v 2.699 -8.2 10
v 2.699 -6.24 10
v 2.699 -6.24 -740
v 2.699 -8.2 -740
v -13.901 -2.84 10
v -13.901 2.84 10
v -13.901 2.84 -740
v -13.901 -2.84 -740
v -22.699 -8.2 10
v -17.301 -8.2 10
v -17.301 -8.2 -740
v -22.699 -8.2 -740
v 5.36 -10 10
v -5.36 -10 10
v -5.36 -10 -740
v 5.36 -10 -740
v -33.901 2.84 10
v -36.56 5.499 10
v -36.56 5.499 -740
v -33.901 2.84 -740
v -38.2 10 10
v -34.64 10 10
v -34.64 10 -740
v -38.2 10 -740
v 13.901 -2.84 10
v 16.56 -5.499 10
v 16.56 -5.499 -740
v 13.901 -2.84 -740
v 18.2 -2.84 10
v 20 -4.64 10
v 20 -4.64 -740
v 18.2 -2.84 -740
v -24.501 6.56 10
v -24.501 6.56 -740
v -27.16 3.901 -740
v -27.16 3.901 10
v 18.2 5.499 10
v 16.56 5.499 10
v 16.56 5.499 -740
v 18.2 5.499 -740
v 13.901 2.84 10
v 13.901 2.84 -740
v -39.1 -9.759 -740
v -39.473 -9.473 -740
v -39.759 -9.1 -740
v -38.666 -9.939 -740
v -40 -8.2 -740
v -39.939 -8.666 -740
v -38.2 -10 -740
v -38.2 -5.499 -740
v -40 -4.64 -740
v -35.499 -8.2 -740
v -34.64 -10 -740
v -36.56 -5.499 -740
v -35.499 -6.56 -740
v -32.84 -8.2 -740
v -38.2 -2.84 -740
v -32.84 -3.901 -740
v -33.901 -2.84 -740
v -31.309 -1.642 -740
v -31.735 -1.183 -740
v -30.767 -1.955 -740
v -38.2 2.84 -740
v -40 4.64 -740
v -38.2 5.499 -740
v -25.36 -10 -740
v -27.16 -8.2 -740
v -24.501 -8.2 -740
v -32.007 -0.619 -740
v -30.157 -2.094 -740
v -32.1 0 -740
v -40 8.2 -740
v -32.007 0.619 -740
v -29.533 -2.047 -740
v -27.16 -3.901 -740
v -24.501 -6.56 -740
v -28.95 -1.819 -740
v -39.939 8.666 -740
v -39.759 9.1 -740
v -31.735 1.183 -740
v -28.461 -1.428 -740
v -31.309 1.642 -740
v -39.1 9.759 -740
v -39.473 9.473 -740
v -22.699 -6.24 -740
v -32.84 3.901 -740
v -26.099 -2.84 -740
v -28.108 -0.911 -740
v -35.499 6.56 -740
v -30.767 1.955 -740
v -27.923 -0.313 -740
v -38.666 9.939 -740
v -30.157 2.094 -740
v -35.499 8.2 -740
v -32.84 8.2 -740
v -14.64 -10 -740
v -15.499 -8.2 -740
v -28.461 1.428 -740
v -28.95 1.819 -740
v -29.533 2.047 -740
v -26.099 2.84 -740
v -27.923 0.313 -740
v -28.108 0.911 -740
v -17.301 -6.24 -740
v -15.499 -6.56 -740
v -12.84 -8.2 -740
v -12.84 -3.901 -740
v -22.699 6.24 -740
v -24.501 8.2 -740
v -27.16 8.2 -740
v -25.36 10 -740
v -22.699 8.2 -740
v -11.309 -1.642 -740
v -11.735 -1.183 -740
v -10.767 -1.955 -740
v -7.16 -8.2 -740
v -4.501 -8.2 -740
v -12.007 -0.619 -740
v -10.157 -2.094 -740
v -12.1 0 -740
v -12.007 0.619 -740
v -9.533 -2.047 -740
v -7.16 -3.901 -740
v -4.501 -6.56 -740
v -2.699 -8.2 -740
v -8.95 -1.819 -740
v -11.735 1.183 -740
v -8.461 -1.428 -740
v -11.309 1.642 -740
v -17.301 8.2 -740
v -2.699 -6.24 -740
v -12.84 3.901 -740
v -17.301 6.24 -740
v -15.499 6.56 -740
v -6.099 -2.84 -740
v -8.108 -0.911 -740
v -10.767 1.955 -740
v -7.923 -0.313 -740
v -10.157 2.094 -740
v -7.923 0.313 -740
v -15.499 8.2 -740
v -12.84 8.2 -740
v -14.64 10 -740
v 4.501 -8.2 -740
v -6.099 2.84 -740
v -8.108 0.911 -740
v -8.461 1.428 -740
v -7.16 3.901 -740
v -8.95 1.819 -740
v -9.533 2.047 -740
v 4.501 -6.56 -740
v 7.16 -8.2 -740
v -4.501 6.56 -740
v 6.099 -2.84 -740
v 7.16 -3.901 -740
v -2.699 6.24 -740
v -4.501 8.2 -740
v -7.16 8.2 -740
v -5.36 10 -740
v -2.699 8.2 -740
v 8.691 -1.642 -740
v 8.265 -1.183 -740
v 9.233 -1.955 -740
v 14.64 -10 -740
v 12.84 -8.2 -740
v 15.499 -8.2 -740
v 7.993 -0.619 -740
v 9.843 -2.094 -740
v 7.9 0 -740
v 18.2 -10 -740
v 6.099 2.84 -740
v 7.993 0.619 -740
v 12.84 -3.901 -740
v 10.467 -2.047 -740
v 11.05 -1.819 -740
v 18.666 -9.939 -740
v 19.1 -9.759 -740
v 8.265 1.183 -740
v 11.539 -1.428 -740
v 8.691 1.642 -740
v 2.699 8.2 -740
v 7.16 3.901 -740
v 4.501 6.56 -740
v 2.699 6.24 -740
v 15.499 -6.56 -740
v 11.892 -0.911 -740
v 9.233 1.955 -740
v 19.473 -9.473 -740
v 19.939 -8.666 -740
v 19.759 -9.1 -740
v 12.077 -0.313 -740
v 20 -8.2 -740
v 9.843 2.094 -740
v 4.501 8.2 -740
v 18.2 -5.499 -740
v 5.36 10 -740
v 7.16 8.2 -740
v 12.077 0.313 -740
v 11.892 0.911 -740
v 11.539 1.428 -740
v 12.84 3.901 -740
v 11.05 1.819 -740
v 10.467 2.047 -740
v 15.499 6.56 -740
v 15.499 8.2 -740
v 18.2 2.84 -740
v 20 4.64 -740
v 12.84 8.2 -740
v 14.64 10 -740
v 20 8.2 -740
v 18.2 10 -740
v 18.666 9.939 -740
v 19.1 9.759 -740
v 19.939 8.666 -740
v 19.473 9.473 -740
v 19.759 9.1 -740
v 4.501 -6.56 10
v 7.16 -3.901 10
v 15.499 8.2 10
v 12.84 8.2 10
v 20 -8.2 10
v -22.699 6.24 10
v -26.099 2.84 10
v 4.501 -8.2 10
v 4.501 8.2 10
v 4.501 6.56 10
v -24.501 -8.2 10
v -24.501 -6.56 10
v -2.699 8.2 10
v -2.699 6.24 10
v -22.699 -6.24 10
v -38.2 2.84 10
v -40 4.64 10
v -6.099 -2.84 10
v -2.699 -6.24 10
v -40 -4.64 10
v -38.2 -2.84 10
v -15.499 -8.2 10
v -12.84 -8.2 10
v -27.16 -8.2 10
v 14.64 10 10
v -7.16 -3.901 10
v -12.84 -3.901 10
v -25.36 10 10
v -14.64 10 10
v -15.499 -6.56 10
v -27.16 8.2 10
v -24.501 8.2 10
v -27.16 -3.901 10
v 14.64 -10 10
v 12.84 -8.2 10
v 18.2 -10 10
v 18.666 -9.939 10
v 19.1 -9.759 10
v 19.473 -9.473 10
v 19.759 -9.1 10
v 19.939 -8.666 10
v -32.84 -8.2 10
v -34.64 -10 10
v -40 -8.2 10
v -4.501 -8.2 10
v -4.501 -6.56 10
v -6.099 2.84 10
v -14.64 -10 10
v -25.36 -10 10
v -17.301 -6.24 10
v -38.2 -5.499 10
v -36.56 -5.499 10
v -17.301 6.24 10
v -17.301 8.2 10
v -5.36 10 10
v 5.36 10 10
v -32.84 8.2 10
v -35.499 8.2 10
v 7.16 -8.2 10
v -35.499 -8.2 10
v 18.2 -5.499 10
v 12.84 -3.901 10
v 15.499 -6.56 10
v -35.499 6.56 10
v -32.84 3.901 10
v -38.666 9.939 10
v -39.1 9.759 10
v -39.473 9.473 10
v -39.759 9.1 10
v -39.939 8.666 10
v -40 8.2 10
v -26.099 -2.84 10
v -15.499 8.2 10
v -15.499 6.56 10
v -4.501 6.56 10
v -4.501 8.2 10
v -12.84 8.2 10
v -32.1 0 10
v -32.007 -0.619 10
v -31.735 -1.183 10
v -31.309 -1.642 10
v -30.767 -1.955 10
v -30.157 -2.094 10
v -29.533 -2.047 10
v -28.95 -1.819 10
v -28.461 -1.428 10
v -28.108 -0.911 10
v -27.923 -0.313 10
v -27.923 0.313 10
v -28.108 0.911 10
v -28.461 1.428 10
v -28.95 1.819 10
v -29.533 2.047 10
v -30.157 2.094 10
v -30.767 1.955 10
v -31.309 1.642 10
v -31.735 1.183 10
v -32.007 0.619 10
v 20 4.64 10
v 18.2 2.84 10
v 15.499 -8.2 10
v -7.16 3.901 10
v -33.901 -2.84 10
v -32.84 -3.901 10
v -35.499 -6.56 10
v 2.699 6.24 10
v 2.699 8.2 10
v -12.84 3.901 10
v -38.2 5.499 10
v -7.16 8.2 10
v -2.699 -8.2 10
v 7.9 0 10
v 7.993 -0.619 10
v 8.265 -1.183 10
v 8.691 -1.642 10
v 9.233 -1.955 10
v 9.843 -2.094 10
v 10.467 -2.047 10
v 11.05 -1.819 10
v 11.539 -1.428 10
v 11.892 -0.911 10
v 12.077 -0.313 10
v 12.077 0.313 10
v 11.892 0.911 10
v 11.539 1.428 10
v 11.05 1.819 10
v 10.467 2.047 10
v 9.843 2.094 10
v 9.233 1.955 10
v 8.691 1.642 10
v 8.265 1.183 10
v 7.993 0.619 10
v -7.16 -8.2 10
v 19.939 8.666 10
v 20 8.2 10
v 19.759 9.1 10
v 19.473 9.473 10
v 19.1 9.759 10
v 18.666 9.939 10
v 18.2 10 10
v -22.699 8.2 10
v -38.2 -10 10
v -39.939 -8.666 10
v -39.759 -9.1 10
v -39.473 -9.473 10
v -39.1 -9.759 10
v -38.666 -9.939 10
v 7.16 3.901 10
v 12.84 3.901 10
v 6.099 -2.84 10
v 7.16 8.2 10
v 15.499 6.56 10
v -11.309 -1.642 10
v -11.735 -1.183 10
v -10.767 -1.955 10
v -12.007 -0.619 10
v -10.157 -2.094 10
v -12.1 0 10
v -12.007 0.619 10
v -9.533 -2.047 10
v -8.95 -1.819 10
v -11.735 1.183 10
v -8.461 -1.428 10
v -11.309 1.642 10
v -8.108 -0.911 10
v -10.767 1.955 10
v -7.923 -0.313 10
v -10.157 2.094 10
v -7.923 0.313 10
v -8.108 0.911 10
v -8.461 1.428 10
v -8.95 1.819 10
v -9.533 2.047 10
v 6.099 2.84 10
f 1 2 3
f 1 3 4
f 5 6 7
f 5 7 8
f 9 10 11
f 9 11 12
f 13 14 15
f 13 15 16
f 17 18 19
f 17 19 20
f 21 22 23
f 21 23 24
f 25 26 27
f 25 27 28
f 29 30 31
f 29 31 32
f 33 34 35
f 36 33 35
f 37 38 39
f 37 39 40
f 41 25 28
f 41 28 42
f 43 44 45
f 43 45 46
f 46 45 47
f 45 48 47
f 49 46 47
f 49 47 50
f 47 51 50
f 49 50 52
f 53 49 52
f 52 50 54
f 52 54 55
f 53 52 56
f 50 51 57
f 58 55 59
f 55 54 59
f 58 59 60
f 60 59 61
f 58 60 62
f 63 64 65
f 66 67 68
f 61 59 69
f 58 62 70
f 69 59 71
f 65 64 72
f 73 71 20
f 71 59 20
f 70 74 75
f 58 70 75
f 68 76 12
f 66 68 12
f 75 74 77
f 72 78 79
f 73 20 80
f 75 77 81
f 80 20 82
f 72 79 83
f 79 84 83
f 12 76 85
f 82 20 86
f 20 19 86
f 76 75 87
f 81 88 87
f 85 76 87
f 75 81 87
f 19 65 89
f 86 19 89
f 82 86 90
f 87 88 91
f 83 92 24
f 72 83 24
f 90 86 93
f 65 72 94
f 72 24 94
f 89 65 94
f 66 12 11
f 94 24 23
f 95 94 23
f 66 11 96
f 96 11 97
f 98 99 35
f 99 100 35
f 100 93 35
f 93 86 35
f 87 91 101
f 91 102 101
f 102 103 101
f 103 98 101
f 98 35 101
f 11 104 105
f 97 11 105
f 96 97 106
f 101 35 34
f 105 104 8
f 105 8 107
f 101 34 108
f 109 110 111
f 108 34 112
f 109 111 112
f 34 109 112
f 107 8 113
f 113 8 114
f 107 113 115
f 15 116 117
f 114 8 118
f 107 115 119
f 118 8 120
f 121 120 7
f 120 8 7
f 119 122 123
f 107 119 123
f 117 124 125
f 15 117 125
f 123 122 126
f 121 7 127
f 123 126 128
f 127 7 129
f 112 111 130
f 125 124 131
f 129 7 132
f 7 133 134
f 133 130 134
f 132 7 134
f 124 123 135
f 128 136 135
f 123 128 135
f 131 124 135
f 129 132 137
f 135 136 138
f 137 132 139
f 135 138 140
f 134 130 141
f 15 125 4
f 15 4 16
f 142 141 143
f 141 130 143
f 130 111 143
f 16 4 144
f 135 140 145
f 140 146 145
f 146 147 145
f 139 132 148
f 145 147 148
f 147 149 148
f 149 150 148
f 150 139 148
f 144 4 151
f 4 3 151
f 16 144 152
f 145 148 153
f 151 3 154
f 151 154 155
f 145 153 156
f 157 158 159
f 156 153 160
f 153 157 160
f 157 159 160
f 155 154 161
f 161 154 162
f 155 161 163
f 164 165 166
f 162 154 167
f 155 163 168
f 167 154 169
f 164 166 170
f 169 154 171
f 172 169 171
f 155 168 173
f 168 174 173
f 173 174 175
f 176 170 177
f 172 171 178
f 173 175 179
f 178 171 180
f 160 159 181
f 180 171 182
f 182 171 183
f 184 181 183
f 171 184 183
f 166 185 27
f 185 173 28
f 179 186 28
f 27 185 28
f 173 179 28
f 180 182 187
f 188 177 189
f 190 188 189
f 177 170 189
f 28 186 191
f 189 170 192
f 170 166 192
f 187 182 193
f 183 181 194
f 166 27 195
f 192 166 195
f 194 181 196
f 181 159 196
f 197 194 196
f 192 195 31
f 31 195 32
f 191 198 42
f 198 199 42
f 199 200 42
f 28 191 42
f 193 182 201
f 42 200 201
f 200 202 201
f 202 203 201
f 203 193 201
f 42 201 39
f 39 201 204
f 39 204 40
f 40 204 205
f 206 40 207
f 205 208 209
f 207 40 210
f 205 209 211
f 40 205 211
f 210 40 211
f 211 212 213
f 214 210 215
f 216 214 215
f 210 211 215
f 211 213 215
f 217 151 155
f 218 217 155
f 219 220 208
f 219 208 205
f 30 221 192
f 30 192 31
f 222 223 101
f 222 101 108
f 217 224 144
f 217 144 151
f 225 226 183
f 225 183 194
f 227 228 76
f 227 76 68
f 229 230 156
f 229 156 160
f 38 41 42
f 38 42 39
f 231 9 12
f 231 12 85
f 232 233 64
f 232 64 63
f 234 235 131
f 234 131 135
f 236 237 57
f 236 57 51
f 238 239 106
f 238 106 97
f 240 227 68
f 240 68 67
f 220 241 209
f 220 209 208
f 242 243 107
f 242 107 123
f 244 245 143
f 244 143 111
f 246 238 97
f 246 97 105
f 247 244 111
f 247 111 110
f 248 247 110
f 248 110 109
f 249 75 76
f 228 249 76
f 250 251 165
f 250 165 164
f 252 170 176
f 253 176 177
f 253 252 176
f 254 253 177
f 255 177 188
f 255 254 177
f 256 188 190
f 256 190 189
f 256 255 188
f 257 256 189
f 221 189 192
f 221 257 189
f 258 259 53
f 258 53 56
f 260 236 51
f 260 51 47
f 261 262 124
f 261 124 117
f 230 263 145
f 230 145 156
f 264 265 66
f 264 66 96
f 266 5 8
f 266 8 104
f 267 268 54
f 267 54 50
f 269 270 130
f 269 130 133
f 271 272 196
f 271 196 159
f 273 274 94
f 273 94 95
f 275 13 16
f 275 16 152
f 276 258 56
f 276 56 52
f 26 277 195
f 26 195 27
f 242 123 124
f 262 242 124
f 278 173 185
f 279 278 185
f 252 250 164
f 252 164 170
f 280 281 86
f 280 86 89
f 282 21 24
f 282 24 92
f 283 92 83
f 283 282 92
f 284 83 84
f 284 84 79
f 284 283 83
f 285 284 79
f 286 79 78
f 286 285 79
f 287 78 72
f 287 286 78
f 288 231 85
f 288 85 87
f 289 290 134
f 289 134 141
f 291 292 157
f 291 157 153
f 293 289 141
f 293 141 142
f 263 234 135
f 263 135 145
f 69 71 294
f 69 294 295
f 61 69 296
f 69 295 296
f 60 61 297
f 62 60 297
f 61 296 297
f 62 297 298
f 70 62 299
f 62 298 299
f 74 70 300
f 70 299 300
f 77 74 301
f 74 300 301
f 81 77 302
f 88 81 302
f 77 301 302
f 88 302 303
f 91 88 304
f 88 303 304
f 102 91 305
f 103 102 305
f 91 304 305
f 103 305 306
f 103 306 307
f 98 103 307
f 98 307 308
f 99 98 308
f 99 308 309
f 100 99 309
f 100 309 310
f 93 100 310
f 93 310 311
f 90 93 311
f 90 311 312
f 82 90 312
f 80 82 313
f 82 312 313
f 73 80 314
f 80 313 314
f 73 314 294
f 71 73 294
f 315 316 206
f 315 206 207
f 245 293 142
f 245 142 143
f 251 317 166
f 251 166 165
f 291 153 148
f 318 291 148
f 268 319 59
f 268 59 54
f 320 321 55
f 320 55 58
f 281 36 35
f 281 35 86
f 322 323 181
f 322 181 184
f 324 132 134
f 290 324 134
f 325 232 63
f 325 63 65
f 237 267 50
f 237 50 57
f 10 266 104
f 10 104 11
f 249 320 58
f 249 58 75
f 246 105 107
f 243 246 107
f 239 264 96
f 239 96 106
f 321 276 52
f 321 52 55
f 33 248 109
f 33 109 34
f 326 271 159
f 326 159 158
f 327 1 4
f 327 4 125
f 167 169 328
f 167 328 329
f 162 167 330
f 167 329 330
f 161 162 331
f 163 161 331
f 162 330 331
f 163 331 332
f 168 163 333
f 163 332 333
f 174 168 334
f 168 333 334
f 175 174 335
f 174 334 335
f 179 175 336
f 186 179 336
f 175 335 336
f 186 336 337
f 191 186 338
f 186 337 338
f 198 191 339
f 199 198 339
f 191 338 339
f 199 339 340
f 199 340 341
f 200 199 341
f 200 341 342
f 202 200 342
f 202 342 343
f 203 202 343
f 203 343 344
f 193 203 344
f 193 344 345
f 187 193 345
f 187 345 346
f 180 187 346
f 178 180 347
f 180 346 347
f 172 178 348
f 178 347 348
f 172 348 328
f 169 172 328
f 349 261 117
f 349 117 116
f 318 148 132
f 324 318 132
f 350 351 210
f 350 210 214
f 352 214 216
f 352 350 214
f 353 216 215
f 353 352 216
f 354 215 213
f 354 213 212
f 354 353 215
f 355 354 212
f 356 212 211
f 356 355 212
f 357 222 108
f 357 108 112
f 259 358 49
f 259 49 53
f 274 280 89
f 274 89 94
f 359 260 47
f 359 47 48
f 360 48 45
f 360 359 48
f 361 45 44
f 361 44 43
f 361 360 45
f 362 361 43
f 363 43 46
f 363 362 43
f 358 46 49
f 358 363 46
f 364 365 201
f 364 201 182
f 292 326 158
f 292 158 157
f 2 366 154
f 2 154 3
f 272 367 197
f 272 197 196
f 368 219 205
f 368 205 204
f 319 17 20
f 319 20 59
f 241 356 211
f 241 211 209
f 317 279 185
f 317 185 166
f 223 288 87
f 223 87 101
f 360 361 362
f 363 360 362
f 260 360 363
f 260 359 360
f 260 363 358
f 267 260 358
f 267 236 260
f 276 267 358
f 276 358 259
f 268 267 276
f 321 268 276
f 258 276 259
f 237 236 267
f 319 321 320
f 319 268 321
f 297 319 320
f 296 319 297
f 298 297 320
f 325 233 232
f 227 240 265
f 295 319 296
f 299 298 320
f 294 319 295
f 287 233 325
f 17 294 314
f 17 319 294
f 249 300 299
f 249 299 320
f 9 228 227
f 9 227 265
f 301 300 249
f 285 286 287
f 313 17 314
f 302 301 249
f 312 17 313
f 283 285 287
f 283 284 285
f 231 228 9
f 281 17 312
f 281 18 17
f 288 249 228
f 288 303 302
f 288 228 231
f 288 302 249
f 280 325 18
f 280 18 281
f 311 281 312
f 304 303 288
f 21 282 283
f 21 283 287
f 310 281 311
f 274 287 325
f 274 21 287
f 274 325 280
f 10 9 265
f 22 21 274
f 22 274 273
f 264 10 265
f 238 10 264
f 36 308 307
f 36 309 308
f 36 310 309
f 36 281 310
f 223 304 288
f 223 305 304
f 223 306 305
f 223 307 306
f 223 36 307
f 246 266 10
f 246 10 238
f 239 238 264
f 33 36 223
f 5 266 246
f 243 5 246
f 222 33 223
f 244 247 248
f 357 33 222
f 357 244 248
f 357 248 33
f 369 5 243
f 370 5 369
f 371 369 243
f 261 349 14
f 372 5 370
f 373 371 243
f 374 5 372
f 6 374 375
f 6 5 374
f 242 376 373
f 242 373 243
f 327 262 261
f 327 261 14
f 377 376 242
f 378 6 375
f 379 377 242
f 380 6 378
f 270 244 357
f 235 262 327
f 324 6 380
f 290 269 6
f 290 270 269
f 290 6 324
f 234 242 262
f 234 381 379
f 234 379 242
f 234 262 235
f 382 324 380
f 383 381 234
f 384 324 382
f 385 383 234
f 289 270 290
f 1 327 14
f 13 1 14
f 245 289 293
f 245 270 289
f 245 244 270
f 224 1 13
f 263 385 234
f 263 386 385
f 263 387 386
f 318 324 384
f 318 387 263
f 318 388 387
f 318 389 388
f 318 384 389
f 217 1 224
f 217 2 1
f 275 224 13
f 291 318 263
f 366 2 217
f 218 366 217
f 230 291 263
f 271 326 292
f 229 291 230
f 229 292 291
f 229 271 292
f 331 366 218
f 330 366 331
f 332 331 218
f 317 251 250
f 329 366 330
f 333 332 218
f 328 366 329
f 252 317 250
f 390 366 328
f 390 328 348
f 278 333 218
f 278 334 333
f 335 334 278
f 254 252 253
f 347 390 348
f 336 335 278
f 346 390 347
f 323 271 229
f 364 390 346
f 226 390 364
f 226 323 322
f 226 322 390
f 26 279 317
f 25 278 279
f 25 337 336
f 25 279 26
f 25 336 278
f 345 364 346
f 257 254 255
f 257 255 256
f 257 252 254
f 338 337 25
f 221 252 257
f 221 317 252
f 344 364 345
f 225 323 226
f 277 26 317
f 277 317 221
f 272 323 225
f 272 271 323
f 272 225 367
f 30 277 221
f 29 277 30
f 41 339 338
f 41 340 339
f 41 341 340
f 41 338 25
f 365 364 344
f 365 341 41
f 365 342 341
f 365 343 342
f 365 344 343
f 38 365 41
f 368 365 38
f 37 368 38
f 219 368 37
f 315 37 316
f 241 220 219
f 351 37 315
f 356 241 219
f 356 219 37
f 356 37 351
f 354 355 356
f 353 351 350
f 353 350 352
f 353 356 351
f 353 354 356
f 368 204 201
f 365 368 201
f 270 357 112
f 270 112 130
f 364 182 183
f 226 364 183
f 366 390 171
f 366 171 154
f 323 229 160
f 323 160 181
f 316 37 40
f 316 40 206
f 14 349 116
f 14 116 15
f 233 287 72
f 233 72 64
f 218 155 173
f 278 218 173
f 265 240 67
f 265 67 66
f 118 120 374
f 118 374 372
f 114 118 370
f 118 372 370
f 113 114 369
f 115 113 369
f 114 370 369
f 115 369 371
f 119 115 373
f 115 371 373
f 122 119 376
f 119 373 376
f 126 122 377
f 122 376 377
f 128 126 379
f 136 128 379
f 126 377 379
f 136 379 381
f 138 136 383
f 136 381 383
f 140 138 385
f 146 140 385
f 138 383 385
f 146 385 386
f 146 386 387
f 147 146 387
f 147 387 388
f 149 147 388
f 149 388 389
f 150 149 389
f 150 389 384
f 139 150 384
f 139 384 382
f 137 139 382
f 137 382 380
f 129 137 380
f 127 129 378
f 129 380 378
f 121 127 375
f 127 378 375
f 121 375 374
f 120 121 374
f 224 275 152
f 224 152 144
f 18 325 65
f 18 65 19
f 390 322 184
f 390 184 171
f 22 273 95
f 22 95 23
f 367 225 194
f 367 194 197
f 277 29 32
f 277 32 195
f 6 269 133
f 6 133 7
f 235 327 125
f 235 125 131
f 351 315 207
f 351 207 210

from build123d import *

# Parameters (mm, degrees)
SKETCH1_R           = 2.1
BOSS_EXTRUDE1_DEPTH = 750


with BuildPart() as part:
    # Sketch1 → Boss-Extrude1 (new body)
    with BuildSketch(Plane.XY.offset(10)):
        with BuildLine():
            Line((-12.84, -8.2), (-15.499339828, -8.2))
            Line((-15.499339828, -8.2), (-15.499339828, -6.56))
            Line((-15.499339828, -6.56), (-12.84, -3.900660172))
            Line((-12.84, -3.900660172), (-7.16, -3.900660172))
            Line((-7.16, -3.900660172), (-4.500660172, -6.56))
            Line((-4.500660172, -6.56), (-4.500660172, -8.2))
            Line((-4.500660172, -8.2), (-7.16, -8.2))
            Line((-7.16, -8.2), (-5.36, -10))
            Line((-5.36, -10), (5.36, -10))
            Line((5.36, -10), (7.16, -8.2))
            Line((7.16, -8.2), (4.500660172, -8.2))
            Line((4.500660172, -8.2), (4.500660172, -6.56))
            Line((4.500660172, -6.56), (7.16, -3.900660172))
            Line((7.16, -3.900660172), (12.84, -3.900660172))
            Line((12.84, -3.900660172), (15.499339828, -6.56))
            Line((15.499339828, -6.56), (15.499339828, -8.2))
            Line((15.499339828, -8.2), (12.84, -8.2))
            Line((12.84, -8.2), (14.64, -10))
            Line((14.64, -10), (18.2, -10))
            ThreePointArc((18.2, -10), (19.472792206, -9.472792206), (20, -8.2))
            Line((20, -8.2), (20, -4.64))
            Line((20, -4.64), (18.2, -2.84))
            Line((18.2, -2.84), (18.2, -5.499339828))
            Line((18.2, -5.499339828), (16.56, -5.499339828))
            Line((16.56, -5.499339828), (13.900660172, -2.84))
            Line((13.900660172, -2.84), (13.900660172, 2.84))
            Line((13.900660172, 2.84), (16.56, 5.499339828))
            Line((16.56, 5.499339828), (18.2, 5.499339828))
            Line((18.2, 5.499339828), (18.2, 2.84))
            Line((18.2, 2.84), (20, 4.64))
            Line((20, 4.64), (20, 8.2))
            ThreePointArc((20, 8.2), (19.472792206, 9.472792206), (18.2, 10))
            Line((18.2, 10), (14.64, 10))
            Line((14.64, 10), (12.84, 8.2))
            Line((12.84, 8.2), (15.499339828, 8.2))
            Line((15.499339828, 8.2), (15.499339828, 6.56))
            Line((15.499339828, 6.56), (12.84, 3.900660172))
            Line((12.84, 3.900660172), (7.16, 3.900660172))
            Line((7.16, 3.900660172), (4.500660172, 6.56))
            Line((4.500660172, 6.56), (4.500660172, 8.2))
            Line((4.500660172, 8.2), (7.16, 8.2))
            Line((7.16, 8.2), (5.36, 10))
            Line((5.36, 10), (-5.36, 10))
            Line((-5.36, 10), (-7.16, 8.2))
            Line((-7.16, 8.2), (-4.500660172, 8.2))
            Line((-4.500660172, 8.2), (-4.500660172, 6.56))
            Line((-4.500660172, 6.56), (-7.16, 3.900660172))
            Line((-7.16, 3.900660172), (-12.84, 3.900660172))
            Line((-12.84, 3.900660172), (-15.499339828, 6.56))
            Line((-15.499339828, 6.56), (-15.499339828, 8.2))
            Line((-15.499339828, 8.2), (-12.84, 8.2))
            Line((-12.84, 8.2), (-14.64, 10))
            Line((-14.64, 10), (-25.36, 10))
            Line((-25.36, 10), (-27.16, 8.2))
            Line((-27.16, 8.2), (-24.500660172, 8.2))
            Line((-24.500660172, 8.2), (-24.500660172, 6.56))
            Line((-24.500660172, 6.56), (-27.16, 3.900660172))
            Line((-27.16, 3.900660172), (-32.84, 3.900660172))
            Line((-32.84, 3.900660172), (-35.499339828, 6.56))
            Line((-35.499339828, 6.56), (-35.499339828, 8.2))
            Line((-35.499339828, 8.2), (-32.84, 8.2))
            Line((-32.84, 8.2), (-34.64, 10))
            Line((-34.64, 10), (-38.2, 10))
            ThreePointArc((-38.2, 10), (-39.472792206, 9.472792206), (-40, 8.2))
            Line((-40, 8.2), (-40, 4.64))
            Line((-40, 4.64), (-38.2, 2.84))
            Line((-38.2, 2.84), (-38.2, 5.499339828))
            Line((-38.2, 5.499339828), (-36.56, 5.499339828))
            Line((-36.56, 5.499339828), (-33.900660172, 2.84))
            Line((-33.900660172, 2.84), (-33.900660172, -2.84))
            Line((-33.900660172, -2.84), (-36.56, -5.499339828))
            Line((-36.56, -5.499339828), (-38.2, -5.499339828))
            Line((-38.2, -5.499339828), (-38.2, -2.84))
            Line((-38.2, -2.84), (-40, -4.64))
            Line((-40, -4.64), (-40, -8.2))
            ThreePointArc((-40, -8.2), (-39.472792206, -9.472792206), (-38.2, -10))
            Line((-38.2, -10), (-34.64, -10))
            Line((-34.64, -10), (-32.84, -8.2))
            Line((-32.84, -8.2), (-35.499339828, -8.2))
            Line((-35.499339828, -8.2), (-35.499339828, -6.56))
            Line((-35.499339828, -6.56), (-32.84, -3.900660172))
            Line((-32.84, -3.900660172), (-27.16, -3.900660172))
            Line((-27.16, -3.900660172), (-24.500660172, -6.56))
            Line((-24.500660172, -6.56), (-24.500660172, -8.2))
            Line((-24.500660172, -8.2), (-27.16, -8.2))
            Line((-27.16, -8.2), (-25.36, -10))
            Line((-25.36, -10), (-14.64, -10))
            Line((-14.64, -10), (-12.84, -8.2))
        make_face()
        with Locations(Location((-10, 0, 0), (0, 0, 180))):
            Circle(SKETCH1_R, mode=Mode.SUBTRACT)
        with Locations(Location((-30, 0, 0), (0, 0, 180))):
            Circle(SKETCH1_R, mode=Mode.SUBTRACT)
        with Locations(Location((10, 0, 0), (0, 0, 180))):
            Circle(SKETCH1_R, mode=Mode.SUBTRACT)
        Polygon((-13.900660172, 2.84), (-13.900660172, -2.84), (-17.300660172, -6.24), (-17.300660172, -8.2), (-22.699339828, -8.2), (-22.699339828, -6.24), (-26.099339828, -2.84), (-26.099339828, 2.84), (-22.699339828, 6.24), (-22.699339828, 8.2), (-17.300660172, 8.2), (-17.300660172, 6.24), align=None, mode=Mode.SUBTRACT)
        Polygon((-6.099339828, -2.84), (-6.099339828, 2.84), (-2.699339828, 6.24), (-2.699339828, 8.2), (2.699339828, 8.2), (2.699339828, 6.24), (6.099339828, 2.84), (6.099339828, -2.84), (2.699339828, -6.24), (2.699339828, -8.2), (-2.699339828, -8.2), (-2.699339828, -6.24), align=None, mode=Mode.SUBTRACT)
    extrude(amount=-BOSS_EXTRUDE1_DEPTH)


solid = part.part
